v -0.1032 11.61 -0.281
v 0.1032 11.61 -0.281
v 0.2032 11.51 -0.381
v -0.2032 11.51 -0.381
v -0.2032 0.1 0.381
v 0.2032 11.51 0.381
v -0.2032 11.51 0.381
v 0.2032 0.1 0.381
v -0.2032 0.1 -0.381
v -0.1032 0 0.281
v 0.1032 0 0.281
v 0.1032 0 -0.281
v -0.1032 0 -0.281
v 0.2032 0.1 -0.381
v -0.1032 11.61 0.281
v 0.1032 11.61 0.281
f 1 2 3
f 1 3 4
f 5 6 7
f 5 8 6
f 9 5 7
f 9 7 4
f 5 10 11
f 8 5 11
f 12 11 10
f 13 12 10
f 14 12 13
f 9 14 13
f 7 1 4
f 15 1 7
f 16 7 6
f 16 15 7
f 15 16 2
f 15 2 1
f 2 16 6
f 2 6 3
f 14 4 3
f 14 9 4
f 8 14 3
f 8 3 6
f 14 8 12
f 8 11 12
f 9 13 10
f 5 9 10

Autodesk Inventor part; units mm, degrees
ref_plane "YZ Plane" through (0, 0, 0) normal (1, 0, 0) x (0, 1, 0)
ref_plane "XZ Plane" through (0, 0, 0) normal (0, 1, 0) x (-1, 0, 0)
ref_plane "XY Plane" through (0, 0, 0) normal (0, 0, 1) x (1, 0, 0)
sketch "Sketch1" plane through (0, 0, 0) normal (0, 1, 0) x (-1, 0, 0)
  line L0 (0.2032, -0.381) -> (-0.2032, -0.381)
  line L1 (-0.2032, -0.381) -> (-0.2032, 0.381)
  line L2 (-0.2032, 0.381) -> (0.2032, 0.381)
  line L3 (0.2032, 0.381) -> (0.2032, -0.381)
  line L4 (0.2032, -0.381) -> (-0.2032, 0.381) construction
  line L5 (-0.2032, -0.381) -> (0.2032, 0.381) construction
  point P0 (0, 0)
  dimension "d0" = 0.4064
  dimension "d1" = 0.762
extrude "Extrusion1" add sketch "Sketch1" along normal blind 11.61
chamfer "Chamfer1" distance 0.1 angle 45 8 edges at (0.2032, 11.61, 0) (0, 11.61, -0.381) (0, 11.61, 0.381) (-0.2032, 11.61, 0) (0.2032, 0, 0) (0, 0, -0.381) (0, 0, 0.381) (-0.2032, 0, 0)
properties part number "Pin" material "Gold"
